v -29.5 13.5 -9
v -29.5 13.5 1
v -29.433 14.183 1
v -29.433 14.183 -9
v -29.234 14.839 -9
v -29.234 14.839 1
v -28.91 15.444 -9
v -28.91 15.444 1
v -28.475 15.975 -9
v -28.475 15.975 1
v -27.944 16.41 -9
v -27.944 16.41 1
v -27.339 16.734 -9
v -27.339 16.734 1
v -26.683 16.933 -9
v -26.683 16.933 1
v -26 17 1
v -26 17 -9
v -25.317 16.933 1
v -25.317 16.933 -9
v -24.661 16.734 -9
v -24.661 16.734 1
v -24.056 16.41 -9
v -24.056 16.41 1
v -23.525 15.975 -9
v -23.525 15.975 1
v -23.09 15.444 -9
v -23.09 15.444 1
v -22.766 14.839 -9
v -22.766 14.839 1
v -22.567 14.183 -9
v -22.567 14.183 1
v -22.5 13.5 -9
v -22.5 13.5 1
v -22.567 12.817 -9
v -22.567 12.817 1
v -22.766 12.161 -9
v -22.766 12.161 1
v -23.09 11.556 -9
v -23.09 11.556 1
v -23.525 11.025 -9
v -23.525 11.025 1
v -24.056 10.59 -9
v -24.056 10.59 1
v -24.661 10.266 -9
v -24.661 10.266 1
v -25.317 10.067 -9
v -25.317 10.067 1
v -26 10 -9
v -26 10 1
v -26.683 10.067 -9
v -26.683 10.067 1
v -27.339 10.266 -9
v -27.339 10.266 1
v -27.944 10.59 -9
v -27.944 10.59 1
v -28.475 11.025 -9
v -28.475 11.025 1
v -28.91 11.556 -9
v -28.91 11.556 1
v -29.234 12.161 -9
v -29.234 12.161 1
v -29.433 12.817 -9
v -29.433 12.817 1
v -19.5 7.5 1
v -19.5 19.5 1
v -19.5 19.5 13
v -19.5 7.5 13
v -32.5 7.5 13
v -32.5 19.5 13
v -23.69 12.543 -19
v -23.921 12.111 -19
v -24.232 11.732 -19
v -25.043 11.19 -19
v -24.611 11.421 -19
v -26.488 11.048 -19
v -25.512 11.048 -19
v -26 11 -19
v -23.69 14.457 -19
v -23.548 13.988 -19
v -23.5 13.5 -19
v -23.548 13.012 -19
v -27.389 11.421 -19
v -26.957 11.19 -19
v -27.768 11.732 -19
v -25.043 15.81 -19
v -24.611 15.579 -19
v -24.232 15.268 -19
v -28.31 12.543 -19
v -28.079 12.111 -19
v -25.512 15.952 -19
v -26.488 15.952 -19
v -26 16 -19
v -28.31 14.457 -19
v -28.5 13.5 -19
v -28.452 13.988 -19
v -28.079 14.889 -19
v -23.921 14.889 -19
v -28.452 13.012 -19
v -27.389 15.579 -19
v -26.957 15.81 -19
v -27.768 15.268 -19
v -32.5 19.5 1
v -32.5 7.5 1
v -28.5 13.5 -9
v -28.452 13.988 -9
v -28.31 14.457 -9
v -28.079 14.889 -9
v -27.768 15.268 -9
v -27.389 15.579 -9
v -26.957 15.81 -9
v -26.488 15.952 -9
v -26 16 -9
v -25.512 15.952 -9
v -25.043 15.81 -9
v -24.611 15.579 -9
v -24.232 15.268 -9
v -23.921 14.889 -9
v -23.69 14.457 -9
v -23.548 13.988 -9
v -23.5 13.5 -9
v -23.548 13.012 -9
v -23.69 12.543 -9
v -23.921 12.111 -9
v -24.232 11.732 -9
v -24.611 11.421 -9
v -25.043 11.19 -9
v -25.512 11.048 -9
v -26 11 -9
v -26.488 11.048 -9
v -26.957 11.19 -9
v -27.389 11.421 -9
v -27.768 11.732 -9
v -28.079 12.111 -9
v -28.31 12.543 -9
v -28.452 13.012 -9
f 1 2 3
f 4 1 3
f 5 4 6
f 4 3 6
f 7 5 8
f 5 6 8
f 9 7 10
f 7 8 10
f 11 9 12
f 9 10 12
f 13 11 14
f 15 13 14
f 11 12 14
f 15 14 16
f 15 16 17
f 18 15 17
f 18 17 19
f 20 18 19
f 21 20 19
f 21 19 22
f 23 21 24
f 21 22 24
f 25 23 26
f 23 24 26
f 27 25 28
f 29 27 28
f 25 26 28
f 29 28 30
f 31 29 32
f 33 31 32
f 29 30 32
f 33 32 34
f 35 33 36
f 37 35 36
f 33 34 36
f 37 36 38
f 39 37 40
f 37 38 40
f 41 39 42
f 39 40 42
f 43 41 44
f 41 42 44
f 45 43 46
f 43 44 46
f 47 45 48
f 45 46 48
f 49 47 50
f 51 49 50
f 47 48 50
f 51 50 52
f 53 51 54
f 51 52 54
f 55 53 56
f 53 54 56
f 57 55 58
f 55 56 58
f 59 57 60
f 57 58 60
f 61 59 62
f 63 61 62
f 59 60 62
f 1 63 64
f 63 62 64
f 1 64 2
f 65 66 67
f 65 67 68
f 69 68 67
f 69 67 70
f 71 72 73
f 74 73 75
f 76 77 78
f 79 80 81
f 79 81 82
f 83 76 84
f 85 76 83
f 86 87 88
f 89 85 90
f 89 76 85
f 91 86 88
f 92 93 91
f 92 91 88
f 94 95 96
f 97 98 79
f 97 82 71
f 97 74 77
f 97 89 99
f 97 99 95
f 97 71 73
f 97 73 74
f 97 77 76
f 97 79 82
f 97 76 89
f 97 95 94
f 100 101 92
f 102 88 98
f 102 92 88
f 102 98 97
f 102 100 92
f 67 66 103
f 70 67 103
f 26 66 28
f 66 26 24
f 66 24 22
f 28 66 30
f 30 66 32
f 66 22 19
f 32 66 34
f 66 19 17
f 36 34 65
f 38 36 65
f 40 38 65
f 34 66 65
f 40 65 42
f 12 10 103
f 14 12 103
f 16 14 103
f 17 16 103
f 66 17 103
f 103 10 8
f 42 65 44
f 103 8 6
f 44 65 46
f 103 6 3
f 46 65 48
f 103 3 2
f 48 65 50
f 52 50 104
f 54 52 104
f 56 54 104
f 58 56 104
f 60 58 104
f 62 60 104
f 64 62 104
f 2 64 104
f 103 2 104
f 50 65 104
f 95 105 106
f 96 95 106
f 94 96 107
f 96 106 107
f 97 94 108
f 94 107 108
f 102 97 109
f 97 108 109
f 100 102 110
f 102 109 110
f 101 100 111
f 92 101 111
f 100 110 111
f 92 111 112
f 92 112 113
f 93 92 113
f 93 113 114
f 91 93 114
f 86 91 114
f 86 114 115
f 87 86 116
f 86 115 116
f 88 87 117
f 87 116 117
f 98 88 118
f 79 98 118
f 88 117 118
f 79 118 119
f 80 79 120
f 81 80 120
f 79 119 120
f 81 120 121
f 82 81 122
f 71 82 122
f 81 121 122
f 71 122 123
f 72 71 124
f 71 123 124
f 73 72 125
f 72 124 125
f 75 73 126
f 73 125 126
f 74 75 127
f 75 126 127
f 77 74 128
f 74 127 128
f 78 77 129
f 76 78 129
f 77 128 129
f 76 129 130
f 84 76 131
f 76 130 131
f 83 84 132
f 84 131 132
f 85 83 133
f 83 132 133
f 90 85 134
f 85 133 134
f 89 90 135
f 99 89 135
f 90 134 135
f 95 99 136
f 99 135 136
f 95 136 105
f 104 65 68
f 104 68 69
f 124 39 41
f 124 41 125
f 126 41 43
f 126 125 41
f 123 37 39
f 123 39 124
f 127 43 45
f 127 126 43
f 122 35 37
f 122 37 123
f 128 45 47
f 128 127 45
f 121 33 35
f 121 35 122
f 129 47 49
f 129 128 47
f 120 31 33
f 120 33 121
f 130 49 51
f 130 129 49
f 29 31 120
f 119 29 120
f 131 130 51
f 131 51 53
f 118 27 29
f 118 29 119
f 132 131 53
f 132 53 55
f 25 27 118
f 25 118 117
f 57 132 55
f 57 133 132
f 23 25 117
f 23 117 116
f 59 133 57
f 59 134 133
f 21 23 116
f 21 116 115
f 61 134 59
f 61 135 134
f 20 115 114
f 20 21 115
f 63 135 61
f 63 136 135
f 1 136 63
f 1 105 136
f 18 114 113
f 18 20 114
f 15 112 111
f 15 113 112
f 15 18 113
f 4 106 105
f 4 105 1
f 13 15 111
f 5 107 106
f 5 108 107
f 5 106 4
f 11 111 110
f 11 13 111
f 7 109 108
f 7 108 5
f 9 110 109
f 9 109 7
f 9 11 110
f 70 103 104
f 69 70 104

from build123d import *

# Parameters (mm, degrees)
SKETCH029_R             = 3.5
PAD029_DEPTH            = 10
SKETCH030_R             = 2.5
PAD030_DEPTH            = 10
SKETCH031_W             = 13
SKETCH031_H             = 12
PAD031_DEPTH            = 12
BODY011_PLACEMENT_ANGLE = 180


with BuildPart() as part:
    # Sketch029 → Pad029 (new body)
    with BuildSketch(Plane.XY):
        Circle(SKETCH029_R)
    extrude(amount=PAD029_DEPTH)

    # Sketch030 (on Face3 of Pad029) → Pad030 (join)
    with BuildSketch(Plane.XY.offset(10)):
        Circle(SKETCH030_R)
    extrude(amount=PAD030_DEPTH)

    # Sketch031 (on Face2 of Pad030) → Pad031 (join)
    with BuildSketch(Plane(origin=(0, 0, 0), x_dir=(1, 0, 0), z_dir=(0, 0, -1))):
        Rectangle(SKETCH031_W, SKETCH031_H)
    extrude(amount=PAD031_DEPTH)


with BuildPart() as part_1:
    # Body011 placement: moved
    add(part.part.moved(Location((-26, 13.5, 1))).rotate(Axis((-26, 13.5, 1), (0, 1, 0)), BODY011_PLACEMENT_ANGLE))


solid = part_1.part
